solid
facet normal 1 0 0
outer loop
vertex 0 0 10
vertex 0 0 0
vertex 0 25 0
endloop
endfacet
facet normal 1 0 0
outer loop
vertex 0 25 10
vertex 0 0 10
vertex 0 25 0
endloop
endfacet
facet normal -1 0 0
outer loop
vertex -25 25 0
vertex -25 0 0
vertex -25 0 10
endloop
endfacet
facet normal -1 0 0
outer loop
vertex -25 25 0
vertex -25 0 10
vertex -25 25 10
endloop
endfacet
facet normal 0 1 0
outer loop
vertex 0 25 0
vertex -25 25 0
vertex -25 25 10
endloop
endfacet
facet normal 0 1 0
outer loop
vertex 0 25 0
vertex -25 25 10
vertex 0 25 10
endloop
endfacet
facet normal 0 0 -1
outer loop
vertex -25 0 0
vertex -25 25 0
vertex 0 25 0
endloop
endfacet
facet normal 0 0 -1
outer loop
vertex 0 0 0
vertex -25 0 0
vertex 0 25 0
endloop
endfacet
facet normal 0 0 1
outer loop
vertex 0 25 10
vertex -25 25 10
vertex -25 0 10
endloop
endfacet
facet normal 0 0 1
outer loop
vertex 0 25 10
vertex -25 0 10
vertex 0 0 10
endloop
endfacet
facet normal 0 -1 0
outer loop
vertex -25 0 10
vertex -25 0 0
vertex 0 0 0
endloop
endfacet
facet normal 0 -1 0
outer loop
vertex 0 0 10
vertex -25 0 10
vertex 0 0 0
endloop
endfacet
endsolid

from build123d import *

# Parameters (mm, degrees)
F0_W     = 25
F0_H     = 25
F1_DEPTH = 25.4
F4_DEPTH = 10


with BuildPart() as f1:
    # F0 (on Top) → F1 (new body)
    with BuildSketch(Plane.XY):
        with Locations((-12.5, 12.5)):
            Rectangle(F0_W, F0_H)
    extrude(amount=F1_DEPTH)


with BuildPart() as f4:
    # F0 (on Top) → F4 (new body)
    with BuildSketch(Plane.XY):
        with Locations((-12.5, 12.5)):
            Rectangle(F0_W, F0_H)
    extrude(amount=F4_DEPTH)


solid = f4.part
